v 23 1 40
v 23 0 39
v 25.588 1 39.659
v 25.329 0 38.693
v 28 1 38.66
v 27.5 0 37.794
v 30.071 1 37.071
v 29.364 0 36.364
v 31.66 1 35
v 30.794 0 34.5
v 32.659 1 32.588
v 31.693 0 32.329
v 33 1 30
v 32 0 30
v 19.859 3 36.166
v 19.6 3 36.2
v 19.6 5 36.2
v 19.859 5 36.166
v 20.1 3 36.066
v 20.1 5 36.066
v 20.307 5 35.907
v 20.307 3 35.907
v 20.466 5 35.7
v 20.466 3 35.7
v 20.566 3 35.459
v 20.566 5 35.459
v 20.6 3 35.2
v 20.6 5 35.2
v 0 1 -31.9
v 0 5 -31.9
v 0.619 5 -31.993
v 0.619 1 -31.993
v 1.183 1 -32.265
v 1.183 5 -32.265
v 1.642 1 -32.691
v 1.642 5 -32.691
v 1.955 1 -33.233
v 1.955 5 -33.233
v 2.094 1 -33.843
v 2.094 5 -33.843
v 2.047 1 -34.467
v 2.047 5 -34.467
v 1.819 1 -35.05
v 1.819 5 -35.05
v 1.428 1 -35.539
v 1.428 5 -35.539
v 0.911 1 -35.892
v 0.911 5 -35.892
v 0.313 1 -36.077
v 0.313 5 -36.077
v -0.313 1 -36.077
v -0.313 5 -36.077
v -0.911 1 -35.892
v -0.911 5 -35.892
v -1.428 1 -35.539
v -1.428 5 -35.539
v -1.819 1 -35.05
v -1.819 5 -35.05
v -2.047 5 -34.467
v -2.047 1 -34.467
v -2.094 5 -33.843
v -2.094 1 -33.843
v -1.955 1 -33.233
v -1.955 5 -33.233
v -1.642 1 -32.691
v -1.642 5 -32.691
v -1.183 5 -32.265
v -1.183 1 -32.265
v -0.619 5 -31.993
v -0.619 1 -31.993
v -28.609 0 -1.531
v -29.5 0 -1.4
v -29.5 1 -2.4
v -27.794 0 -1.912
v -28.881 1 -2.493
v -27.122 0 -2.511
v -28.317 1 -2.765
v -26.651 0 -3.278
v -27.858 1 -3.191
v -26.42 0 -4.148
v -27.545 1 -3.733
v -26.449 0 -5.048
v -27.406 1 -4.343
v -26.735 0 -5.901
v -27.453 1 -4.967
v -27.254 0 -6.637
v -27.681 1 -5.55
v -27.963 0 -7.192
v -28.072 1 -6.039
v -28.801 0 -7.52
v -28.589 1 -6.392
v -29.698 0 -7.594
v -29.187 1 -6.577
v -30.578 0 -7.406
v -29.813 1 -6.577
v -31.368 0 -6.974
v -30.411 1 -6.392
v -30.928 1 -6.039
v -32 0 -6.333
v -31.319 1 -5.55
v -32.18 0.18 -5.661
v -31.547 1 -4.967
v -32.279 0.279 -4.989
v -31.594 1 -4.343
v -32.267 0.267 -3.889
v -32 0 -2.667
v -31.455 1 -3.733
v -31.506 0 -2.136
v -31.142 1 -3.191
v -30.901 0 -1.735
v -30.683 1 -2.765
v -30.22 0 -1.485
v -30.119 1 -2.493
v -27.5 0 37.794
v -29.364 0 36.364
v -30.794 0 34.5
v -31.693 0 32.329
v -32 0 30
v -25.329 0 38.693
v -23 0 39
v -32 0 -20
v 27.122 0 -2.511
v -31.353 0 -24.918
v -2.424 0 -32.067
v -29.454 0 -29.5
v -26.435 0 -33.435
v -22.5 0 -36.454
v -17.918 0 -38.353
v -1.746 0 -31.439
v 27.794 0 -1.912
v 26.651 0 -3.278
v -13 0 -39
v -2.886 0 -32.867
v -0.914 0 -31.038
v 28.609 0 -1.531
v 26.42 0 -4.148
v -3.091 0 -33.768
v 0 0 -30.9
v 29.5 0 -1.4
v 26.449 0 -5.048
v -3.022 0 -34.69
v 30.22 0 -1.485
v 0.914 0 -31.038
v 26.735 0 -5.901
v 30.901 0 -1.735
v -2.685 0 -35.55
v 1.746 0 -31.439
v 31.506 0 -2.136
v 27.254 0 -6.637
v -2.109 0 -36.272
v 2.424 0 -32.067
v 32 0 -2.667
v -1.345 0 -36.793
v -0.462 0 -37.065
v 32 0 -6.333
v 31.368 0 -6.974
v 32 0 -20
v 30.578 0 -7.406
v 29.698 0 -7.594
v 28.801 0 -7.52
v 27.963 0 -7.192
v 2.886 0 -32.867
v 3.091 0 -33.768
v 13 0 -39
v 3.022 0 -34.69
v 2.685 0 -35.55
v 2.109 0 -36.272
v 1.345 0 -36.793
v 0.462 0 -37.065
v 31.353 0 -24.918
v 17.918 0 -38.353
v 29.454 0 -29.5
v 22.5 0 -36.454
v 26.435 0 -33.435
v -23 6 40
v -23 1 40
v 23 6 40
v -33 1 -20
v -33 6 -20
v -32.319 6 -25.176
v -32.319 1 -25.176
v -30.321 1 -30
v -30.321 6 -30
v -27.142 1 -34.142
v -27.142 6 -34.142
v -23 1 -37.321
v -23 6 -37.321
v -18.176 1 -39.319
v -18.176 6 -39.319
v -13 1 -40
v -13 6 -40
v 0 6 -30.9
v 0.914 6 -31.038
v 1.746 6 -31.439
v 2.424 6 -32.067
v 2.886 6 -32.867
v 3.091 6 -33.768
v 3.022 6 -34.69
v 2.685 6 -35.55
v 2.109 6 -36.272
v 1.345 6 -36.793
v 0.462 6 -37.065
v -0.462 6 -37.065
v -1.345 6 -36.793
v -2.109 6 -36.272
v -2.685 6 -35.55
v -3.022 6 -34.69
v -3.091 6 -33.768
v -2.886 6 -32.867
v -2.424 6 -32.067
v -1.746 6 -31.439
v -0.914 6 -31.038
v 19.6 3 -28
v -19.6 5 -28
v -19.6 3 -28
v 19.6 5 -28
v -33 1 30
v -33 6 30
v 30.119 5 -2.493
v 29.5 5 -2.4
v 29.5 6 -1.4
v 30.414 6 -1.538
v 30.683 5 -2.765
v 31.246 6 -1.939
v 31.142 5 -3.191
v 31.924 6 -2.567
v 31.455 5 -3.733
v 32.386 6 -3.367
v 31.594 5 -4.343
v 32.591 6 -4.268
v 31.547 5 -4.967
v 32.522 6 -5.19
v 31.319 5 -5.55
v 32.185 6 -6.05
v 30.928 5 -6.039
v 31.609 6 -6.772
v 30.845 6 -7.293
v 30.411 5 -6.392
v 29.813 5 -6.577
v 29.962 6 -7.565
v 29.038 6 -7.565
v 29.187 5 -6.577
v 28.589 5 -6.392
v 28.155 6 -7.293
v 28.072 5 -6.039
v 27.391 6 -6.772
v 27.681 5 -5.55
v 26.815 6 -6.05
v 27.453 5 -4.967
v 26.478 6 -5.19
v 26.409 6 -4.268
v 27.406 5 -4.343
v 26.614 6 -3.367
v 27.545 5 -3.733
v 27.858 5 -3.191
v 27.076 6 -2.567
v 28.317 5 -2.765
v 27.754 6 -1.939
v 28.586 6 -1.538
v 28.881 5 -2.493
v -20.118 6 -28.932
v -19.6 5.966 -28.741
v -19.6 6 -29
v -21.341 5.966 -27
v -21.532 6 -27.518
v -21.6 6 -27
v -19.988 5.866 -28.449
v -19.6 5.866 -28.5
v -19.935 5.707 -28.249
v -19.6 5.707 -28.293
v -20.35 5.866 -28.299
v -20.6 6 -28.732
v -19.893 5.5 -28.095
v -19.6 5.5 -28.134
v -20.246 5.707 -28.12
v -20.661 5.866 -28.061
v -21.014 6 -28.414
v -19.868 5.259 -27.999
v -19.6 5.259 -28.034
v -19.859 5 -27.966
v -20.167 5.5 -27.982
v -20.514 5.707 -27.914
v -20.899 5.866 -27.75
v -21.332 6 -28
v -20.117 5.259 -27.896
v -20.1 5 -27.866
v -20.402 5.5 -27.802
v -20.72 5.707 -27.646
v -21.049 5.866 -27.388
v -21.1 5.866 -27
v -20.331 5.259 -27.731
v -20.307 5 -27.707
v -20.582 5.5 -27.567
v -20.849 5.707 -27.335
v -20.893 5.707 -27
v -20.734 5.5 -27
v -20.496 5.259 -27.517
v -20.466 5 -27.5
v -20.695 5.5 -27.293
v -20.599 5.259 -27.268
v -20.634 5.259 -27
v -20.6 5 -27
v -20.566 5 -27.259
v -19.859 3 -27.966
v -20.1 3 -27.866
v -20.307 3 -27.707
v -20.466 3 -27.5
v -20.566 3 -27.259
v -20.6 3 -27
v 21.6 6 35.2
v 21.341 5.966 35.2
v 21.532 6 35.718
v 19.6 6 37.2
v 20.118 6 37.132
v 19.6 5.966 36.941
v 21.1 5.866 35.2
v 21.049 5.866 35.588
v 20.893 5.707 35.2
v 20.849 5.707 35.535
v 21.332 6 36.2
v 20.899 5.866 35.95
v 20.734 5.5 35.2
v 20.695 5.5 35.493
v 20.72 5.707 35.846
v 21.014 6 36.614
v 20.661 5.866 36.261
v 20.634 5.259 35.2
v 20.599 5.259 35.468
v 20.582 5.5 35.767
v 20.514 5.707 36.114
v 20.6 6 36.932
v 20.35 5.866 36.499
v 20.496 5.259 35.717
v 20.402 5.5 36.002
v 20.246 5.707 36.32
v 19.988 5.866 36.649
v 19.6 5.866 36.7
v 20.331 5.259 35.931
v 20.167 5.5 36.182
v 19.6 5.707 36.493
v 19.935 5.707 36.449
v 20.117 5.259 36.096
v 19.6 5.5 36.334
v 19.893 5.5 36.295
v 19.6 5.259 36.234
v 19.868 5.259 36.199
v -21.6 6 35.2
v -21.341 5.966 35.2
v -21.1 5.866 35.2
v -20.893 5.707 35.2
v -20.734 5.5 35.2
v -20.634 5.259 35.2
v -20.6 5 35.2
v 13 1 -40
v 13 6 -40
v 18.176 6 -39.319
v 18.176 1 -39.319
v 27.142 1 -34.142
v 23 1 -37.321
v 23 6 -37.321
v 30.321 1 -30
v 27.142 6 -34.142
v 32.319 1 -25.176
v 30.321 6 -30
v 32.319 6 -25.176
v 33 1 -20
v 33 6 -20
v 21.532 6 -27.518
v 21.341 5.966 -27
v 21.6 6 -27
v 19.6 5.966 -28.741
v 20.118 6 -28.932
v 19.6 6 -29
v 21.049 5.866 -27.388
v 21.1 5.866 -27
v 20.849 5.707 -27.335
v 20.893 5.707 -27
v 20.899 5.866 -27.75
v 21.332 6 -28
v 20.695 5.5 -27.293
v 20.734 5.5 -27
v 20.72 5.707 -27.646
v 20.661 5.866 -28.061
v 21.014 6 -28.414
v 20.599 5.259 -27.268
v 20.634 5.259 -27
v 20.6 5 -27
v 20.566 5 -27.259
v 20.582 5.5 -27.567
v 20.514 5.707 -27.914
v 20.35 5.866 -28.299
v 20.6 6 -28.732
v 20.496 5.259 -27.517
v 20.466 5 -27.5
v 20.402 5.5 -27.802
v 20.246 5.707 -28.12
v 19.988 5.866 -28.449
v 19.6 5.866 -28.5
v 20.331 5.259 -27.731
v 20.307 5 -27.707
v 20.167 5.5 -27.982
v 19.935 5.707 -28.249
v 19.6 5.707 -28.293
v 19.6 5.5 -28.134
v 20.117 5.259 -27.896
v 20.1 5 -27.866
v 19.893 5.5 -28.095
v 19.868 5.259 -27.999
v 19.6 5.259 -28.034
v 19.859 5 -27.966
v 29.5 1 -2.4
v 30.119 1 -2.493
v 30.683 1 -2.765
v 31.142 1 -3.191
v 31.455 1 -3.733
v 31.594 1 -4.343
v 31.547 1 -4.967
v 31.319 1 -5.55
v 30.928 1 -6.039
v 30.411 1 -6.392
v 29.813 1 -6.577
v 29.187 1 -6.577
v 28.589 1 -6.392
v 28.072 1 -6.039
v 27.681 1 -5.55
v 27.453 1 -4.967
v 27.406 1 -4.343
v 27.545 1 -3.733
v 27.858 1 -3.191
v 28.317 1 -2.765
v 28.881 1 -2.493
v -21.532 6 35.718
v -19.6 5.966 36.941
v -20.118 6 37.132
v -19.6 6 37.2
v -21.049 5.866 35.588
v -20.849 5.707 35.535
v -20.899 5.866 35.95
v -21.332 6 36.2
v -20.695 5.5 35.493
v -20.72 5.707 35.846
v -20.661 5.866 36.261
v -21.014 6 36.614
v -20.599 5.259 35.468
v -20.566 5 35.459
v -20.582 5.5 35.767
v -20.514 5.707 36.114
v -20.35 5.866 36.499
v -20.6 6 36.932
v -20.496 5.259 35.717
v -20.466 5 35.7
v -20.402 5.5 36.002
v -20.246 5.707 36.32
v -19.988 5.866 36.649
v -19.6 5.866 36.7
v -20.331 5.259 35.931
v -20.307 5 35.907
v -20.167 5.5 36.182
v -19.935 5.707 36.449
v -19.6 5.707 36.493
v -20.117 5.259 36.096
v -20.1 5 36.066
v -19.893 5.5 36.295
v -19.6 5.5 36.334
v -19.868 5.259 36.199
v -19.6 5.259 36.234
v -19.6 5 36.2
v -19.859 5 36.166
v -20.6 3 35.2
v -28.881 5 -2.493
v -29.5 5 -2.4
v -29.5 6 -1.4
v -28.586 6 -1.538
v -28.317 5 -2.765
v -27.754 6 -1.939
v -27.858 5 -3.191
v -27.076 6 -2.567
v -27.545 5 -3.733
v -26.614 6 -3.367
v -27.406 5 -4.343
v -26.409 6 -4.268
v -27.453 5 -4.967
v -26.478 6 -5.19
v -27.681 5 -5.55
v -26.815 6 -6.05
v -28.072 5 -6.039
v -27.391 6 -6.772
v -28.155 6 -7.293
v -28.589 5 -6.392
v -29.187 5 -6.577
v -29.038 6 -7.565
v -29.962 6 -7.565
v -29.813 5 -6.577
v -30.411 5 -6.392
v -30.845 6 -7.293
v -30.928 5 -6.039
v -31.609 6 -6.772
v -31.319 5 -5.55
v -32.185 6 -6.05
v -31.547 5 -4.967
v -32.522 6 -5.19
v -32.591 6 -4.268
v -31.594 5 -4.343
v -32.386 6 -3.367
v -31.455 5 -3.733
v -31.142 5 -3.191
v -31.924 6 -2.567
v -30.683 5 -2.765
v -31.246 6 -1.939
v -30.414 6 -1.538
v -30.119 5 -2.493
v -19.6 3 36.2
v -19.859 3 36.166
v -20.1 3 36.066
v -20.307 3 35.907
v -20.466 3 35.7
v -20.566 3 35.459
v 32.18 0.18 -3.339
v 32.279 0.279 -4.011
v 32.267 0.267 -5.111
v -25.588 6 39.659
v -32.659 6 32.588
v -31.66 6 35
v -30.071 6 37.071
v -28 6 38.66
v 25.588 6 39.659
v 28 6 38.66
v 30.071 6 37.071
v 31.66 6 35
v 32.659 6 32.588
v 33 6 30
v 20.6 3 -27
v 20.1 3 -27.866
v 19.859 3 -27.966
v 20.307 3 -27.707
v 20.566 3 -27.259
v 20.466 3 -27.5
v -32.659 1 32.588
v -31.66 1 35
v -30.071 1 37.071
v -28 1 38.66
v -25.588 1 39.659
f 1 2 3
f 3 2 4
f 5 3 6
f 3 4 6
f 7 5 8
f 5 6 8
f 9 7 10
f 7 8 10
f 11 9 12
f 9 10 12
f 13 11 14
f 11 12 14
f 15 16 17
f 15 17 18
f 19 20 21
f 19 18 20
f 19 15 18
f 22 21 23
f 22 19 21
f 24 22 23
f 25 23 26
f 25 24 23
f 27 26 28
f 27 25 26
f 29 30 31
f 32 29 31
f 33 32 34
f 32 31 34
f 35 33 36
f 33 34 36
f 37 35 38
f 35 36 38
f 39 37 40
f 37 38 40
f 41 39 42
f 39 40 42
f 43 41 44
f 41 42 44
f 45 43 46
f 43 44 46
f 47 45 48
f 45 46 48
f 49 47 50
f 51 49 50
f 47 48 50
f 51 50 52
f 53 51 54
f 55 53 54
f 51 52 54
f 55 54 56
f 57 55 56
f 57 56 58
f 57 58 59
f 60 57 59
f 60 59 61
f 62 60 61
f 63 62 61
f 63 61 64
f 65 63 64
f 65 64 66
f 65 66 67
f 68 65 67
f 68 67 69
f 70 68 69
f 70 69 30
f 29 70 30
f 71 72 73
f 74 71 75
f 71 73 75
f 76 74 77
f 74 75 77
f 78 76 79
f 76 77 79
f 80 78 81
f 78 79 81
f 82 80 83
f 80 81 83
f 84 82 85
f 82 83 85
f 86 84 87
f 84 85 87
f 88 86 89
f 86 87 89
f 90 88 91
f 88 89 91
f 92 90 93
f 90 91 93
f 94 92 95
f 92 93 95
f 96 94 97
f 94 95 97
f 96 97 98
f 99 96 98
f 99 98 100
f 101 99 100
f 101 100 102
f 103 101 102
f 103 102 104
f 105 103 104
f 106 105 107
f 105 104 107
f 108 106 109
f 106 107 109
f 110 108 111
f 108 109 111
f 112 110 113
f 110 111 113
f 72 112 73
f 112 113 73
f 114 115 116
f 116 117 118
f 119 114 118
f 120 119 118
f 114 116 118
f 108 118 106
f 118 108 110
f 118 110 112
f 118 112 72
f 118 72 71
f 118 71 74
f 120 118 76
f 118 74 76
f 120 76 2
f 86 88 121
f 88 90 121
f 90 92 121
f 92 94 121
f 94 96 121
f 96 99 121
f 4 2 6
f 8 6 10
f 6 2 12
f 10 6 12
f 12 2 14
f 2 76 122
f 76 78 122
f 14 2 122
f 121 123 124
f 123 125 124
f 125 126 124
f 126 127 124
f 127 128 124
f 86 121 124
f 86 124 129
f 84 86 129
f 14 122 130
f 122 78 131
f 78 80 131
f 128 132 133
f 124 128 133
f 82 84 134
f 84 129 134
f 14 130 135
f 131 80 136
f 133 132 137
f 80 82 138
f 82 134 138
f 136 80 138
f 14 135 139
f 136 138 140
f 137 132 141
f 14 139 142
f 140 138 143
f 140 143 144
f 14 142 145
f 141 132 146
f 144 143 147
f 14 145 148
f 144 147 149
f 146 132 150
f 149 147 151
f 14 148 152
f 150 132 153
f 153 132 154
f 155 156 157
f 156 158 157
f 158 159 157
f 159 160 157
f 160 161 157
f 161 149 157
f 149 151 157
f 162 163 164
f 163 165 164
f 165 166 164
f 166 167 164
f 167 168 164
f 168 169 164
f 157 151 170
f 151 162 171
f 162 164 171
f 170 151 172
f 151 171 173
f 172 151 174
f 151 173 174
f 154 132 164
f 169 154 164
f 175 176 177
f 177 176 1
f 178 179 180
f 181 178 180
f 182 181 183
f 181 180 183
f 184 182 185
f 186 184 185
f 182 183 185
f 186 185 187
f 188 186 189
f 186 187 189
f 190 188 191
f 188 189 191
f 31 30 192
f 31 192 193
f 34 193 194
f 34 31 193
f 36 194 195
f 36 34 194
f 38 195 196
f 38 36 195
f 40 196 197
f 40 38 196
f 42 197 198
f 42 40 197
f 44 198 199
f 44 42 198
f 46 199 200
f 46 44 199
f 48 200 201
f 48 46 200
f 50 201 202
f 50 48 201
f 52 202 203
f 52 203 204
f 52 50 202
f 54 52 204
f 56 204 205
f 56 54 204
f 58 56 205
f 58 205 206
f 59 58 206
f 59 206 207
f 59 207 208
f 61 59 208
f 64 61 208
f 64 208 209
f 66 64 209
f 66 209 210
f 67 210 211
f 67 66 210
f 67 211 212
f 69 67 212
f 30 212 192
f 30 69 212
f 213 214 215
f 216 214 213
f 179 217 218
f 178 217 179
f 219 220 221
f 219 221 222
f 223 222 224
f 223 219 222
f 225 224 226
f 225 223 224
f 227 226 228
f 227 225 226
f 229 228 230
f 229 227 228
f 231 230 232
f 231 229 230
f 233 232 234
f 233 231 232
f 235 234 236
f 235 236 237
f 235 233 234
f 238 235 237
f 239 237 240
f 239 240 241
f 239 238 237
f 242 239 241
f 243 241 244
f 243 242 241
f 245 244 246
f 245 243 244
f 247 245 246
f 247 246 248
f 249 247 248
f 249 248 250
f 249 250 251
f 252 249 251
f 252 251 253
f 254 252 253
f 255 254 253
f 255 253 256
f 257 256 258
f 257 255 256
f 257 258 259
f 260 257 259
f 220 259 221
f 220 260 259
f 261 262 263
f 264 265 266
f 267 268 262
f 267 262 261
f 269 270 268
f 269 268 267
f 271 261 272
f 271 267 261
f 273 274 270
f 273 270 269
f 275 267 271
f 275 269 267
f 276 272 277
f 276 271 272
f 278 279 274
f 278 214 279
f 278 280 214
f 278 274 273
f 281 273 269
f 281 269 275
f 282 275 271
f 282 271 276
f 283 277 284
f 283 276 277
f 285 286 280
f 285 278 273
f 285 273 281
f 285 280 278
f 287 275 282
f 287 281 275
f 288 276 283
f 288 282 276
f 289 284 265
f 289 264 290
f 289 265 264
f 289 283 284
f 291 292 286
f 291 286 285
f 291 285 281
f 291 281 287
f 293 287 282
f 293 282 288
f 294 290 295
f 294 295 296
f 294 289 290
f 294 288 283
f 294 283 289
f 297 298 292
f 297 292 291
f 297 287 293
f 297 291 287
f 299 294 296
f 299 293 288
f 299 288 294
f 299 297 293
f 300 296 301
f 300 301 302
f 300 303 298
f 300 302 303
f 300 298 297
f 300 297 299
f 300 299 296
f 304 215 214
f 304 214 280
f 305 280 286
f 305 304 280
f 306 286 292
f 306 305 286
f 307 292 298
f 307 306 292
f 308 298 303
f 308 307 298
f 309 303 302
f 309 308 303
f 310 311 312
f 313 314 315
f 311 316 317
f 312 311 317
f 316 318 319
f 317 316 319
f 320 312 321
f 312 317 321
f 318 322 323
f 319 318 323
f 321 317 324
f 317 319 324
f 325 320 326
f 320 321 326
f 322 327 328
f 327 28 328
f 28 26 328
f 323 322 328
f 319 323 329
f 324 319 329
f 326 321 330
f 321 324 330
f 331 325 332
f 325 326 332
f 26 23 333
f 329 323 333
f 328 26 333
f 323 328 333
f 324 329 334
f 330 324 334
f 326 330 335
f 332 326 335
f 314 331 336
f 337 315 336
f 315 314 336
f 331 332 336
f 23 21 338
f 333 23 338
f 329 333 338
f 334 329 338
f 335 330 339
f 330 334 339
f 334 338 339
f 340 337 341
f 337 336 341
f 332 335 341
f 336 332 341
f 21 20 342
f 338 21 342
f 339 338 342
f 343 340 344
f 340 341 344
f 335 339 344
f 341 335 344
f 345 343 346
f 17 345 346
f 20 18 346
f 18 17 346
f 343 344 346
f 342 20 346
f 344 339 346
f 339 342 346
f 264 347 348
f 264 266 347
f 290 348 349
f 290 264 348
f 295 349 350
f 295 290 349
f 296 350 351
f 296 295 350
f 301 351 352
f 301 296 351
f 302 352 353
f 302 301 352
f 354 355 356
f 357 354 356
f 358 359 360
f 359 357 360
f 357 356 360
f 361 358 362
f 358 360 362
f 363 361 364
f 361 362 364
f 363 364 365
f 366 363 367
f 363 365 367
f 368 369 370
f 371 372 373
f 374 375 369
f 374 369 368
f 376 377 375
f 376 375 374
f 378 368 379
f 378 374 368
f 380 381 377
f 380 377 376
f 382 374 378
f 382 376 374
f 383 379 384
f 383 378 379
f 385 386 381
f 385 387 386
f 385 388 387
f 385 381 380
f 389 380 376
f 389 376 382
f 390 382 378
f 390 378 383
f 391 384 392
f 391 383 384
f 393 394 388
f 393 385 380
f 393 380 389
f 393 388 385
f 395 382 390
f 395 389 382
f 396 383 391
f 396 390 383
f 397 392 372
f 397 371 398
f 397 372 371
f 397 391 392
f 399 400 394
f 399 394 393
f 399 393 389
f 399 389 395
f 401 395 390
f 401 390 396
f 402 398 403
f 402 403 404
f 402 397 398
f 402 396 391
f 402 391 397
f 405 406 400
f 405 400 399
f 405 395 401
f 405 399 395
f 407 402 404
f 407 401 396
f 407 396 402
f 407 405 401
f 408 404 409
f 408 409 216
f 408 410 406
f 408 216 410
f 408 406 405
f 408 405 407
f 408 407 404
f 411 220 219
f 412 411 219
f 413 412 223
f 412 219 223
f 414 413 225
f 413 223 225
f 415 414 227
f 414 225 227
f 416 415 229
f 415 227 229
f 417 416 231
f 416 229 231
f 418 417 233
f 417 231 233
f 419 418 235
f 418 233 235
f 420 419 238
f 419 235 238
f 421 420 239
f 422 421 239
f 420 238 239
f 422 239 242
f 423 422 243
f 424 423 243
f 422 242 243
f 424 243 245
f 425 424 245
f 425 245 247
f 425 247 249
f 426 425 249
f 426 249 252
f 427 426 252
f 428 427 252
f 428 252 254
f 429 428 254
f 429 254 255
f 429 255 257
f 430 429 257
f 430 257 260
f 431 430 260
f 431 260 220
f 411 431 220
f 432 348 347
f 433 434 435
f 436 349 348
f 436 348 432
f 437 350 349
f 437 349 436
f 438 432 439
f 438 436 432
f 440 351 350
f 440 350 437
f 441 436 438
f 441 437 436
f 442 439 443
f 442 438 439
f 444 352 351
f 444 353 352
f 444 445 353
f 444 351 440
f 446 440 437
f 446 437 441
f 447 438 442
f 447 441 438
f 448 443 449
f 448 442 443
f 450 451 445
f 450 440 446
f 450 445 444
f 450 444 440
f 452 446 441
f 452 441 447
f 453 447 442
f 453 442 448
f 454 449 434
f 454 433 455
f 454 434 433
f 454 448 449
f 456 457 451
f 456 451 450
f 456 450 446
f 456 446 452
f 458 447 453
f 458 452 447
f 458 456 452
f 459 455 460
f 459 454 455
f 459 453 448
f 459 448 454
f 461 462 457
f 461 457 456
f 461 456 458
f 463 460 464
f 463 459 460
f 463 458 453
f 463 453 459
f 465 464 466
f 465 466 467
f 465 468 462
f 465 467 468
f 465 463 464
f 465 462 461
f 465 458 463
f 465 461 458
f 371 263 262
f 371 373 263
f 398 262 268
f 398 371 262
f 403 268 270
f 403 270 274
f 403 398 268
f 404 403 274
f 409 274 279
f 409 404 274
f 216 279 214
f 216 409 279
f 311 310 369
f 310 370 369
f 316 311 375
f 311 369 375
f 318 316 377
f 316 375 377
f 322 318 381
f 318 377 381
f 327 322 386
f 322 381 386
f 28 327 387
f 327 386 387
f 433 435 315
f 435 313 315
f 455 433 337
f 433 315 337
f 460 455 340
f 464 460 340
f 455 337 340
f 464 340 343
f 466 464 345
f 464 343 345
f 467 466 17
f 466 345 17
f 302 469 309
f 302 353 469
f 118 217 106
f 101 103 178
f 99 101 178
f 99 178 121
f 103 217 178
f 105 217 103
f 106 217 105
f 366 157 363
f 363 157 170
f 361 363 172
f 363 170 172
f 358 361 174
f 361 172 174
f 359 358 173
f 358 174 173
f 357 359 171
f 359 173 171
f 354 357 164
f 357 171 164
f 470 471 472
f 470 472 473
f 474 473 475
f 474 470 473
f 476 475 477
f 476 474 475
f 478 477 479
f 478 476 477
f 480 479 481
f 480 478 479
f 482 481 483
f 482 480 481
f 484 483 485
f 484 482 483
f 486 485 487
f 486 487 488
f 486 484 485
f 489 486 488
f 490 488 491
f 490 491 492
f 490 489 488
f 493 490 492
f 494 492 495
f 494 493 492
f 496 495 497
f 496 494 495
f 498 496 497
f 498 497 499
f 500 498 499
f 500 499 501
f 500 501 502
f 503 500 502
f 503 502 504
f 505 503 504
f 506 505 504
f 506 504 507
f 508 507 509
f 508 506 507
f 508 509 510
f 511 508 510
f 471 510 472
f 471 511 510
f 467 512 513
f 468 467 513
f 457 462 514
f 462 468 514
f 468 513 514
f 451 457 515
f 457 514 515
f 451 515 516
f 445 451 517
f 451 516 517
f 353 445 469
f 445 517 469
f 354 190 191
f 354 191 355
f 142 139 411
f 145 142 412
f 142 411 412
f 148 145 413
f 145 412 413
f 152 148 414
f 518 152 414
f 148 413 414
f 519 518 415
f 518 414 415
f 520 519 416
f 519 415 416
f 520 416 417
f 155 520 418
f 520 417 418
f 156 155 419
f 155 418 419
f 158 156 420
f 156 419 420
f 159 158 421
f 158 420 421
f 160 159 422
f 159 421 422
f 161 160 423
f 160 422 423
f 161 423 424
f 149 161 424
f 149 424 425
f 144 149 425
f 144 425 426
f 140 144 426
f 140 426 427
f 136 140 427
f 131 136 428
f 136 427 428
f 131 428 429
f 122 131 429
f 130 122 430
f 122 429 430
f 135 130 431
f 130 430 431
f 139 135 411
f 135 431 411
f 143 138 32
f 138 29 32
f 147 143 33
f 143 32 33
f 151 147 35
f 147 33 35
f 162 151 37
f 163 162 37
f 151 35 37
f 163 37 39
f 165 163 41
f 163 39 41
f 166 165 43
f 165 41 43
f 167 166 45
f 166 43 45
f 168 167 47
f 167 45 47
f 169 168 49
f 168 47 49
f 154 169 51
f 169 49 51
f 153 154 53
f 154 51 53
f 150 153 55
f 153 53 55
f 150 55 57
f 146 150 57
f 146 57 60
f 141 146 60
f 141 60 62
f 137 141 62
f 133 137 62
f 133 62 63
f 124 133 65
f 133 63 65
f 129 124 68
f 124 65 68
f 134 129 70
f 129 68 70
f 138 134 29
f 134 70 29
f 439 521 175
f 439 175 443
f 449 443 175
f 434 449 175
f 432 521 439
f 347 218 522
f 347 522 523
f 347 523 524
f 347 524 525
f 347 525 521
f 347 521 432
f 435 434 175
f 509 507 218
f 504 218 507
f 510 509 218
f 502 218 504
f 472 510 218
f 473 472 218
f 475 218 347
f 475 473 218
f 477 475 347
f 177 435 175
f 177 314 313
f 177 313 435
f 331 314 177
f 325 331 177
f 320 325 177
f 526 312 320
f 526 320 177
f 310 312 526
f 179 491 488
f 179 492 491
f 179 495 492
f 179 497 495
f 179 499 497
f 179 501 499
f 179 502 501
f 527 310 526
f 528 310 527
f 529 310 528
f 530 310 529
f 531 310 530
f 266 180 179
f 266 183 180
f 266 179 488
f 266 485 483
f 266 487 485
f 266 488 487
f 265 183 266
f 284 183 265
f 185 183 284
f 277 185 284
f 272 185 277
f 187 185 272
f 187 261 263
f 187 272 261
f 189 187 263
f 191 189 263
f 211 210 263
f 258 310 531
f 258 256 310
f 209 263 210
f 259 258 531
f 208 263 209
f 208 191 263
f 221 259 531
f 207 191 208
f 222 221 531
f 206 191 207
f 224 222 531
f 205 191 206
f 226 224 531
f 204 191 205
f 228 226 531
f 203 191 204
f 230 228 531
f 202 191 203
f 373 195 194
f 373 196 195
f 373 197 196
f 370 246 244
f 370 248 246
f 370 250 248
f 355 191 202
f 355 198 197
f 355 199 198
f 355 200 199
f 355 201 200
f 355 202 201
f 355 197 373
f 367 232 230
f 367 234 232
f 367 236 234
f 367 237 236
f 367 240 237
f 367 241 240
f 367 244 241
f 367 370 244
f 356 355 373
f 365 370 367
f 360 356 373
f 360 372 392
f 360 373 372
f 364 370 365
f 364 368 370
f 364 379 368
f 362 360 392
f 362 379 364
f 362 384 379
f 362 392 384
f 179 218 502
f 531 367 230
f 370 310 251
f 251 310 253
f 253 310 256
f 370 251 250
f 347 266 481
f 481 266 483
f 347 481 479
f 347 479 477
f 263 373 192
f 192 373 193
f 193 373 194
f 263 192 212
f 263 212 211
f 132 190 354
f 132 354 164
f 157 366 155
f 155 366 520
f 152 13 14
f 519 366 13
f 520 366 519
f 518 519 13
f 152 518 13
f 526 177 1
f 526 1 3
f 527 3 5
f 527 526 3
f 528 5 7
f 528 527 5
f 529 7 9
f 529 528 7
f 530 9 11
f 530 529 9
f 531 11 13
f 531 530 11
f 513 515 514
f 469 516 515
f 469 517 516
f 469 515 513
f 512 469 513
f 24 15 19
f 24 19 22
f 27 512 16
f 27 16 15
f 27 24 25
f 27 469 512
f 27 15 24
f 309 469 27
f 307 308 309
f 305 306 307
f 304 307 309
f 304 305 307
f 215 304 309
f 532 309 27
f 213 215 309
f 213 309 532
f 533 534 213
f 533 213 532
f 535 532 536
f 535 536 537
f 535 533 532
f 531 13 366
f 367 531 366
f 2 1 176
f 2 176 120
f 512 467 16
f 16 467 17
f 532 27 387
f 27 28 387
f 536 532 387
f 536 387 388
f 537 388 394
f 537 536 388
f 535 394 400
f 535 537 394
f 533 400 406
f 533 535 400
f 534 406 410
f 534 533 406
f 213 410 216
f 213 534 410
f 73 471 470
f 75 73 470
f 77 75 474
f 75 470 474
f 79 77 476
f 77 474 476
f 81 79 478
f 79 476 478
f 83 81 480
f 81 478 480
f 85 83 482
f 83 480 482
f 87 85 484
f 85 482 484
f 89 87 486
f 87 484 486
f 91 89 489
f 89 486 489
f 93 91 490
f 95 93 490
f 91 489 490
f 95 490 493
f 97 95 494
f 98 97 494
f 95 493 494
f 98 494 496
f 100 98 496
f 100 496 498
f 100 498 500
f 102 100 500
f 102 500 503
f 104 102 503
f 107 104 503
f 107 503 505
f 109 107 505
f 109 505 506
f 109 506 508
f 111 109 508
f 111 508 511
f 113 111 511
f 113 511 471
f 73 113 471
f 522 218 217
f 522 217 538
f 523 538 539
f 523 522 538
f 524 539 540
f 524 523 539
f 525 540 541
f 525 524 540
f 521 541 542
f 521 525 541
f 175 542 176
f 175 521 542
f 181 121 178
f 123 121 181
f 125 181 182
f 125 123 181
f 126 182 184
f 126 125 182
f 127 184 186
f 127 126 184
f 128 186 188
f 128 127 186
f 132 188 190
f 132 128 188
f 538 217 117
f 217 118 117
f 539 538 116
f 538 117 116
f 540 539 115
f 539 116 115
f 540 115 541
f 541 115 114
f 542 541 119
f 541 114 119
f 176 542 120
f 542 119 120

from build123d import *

# Parameters (mm, degrees)
SKETCH_1_W          = 66
SKETCH_1_H          = 80
EXTRUDE_1_DEPTH     = 6
SKETCH_2_W          = 41.2
SKETCH_2_H          = 64.2
CUT_EXTRUDE_1_DEPTH = 3
FILLET_1_R          = 1
SKETCH_3_R          = 2.1
CUT_EXTRUDE_2_DEPTH = 53.201532545
CHAMFER_1_SIZE      = 1
FILLET_2_R          = 20
FILLET_3_R          = 10
CHAMFER_2_SIZE      = 1


with BuildPart() as part:
    # Эскиз1 → Бобышка-Вытянуть1 (new body)
    with BuildSketch(Plane(origin=(0, 0, 0), x_dir=(1, 0, 0), z_dir=(0, 1, 0))):
        Rectangle(SKETCH_1_W, SKETCH_1_H)
    extrude(amount=EXTRUDE_1_DEPTH)

    # Эскиз2 → Вырез-Вытянуть1 (cut)
    with BuildSketch(Plane(origin=(0, 6, 0), x_dir=(1, 0, 0), z_dir=(0, 1, 0))):
        with Locations((0, -4.1)):
            Rectangle(SKETCH_2_W, SKETCH_2_H)
    extrude(amount=-CUT_EXTRUDE_1_DEPTH, mode=Mode.SUBTRACT)

    # Скругление1
    fillet_1_edges = [part.edges().sort_by_distance(p)[0] for p in [
        (20.6, 4.5, -28),
        (20.6, 4.5, 36.2),
        (-20.6, 4.5, 36.2),
        (-20.6, 4.5, -28),
        (20.6, 6, 4.1),
        (0, 6, -28),
        (-20.6, 6, 4.1),
        (0, 6, 36.2),
    ]]
    fillet(fillet_1_edges, radius=FILLET_1_R)

    # Эскиз3 → Вырез-Вытянуть2 (cut, through all)
    with BuildSketch(Plane(origin=(0, 6, 0), x_dir=(1, 0, 0), z_dir=(0, 1, 0))):
        with Locations(Location((0, 34, 0), (0, 0, 270))):
            Circle(SKETCH_3_R)
        with Locations(Location((-29.5, 4.5, 0), (0, 0, 270))):
            Circle(SKETCH_3_R)
        with Locations(Location((29.5, 4.5, 0), (0, 0, 270))):
            Circle(SKETCH_3_R)
    extrude(amount=-CUT_EXTRUDE_2_DEPTH, mode=Mode.SUBTRACT)

    # Фаска1
    chamfer_1_edges = [part.edges().sort_by_distance(p)[0] for p in [
        (0, 6, -36.1),
        (-29.5, 6, -6.6),
        (29.5, 6, -6.6),
    ]]
    chamfer(chamfer_1_edges, length=CHAMFER_1_SIZE)

    # Скругление2
    fillet_2_edges = [part.edges().sort_by_distance(p)[0] for p in [
        (-33, 3, -40),
        (33, 3, -40),
    ]]
    fillet(fillet_2_edges, radius=FILLET_2_R)

    # Скругление3
    fillet_3_edges = [part.edges().sort_by_distance(p)[0] for p in [
        (33, 3, 40),
        (-33, 3, 40),
    ]]
    fillet(fillet_3_edges, radius=FILLET_3_R)

    # Фаска2
    # the kernel refuses this chamfer: 1 mm, written as the material it takes off along each edge
    with BuildSketch(Plane(origin=(-23, 0, 30), x_dir=(-1, 0, 0), z_dir=(0, 0, -1))) as chamfer_2_piece_1:
        Polygon((10, CHAMFER_2_SIZE), (10 - CHAMFER_2_SIZE, 0), (10, 0), align=None)
    revolve(axis=Axis((-23, 0, 30), (0, 1, 0)), revolution_arc=90, mode=Mode.SUBTRACT)
    with BuildSketch(Plane(origin=(0, 0, -34), x_dir=(0, 0, 1), z_dir=(-1, 0, 0))) as chamfer_2_piece_2:
        Polygon((2.1 + CHAMFER_2_SIZE, 0), (2.1, CHAMFER_2_SIZE), (2.1, 0), align=None)
    revolve(axis=Axis((0, 0, -34), (0, 1, 0)), mode=Mode.SUBTRACT)
    with BuildSketch(Plane(origin=(-29.5, 0, -4.5), x_dir=(0, 0, 1), z_dir=(-1, 0, 0))) as chamfer_2_piece_3:
        Polygon((2.1 + CHAMFER_2_SIZE, 0), (2.1, CHAMFER_2_SIZE), (2.1, 0), align=None)
    revolve(axis=Axis((-29.5, 0, -4.5), (0, 1, 0)), mode=Mode.SUBTRACT)
    with BuildSketch(Plane(origin=(29.5, 0, -4.5), x_dir=(0, 0, 1), z_dir=(-1, 0, 0))) as chamfer_2_piece_4:
        Polygon((2.1 + CHAMFER_2_SIZE, 0), (2.1, CHAMFER_2_SIZE), (2.1, 0), align=None)
    revolve(axis=Axis((29.5, 0, -4.5), (0, 1, 0)), mode=Mode.SUBTRACT)
    with BuildSketch(Plane(origin=(-33, 0, -20), x_dir=(-0.02749587661058908, 0.9996219169112968, 0), z_dir=(0, 0, 1)), Plane(origin=(33, 0, 30), x_dir=(0.02749587661058908, 0.9996219169112968, 0), z_dir=(0, 0, -1))) as chamfer_2_piece_5:
        Polygon((CHAMFER_2_SIZE * 0.999621916911, -CHAMFER_2_SIZE * 0.0274958766106), (-CHAMFER_2_SIZE * 0.0274958766106, -CHAMFER_2_SIZE * 0.999621916911), (0, 0), align=None)
    extrude(amount=50, mode=Mode.SUBTRACT)
    with BuildSketch(Plane(origin=(13, 0, -40), x_dir=(0, 0.9996219169112968, -0.02749587661058908), z_dir=(-1, 0, 0))) as chamfer_2_piece_6:
        Polygon((CHAMFER_2_SIZE * 0.999621916911, -CHAMFER_2_SIZE * 0.0274958766106), (-CHAMFER_2_SIZE * 0.0274958766106, -CHAMFER_2_SIZE * 0.999621916911), (0, 0), align=None)
    extrude(amount=26, mode=Mode.SUBTRACT)
    with BuildSketch(Plane(origin=(13, 0, -20), x_dir=(1, 0, 0), z_dir=(0, 0, 1))) as chamfer_2_piece_7:
        Polygon((20, CHAMFER_2_SIZE), (20 - CHAMFER_2_SIZE, 0), (20, 0), align=None)
    revolve(axis=Axis((13, 0, -20), (0, 1, 0)), revolution_arc=90, mode=Mode.SUBTRACT)
    with BuildSketch(Plane(origin=(-13, 0, -20), x_dir=(-1, 0, 0), z_dir=(0, 0, 1))) as chamfer_2_piece_8:
        Polygon((20, -CHAMFER_2_SIZE), (20 - CHAMFER_2_SIZE, 0), (20, 0), align=None)
    revolve(axis=Axis((-13, 0, -20), (0, -1, 0)), revolution_arc=90, mode=Mode.SUBTRACT)
    with BuildSketch(Plane(origin=(-23, 0, 40), x_dir=(0, 0.9996219169112968, 0.02749587661058908), z_dir=(1, 0, 0))) as chamfer_2_piece_9:
        Polygon((CHAMFER_2_SIZE * 0.999621916911, -CHAMFER_2_SIZE * 0.0274958766106), (-CHAMFER_2_SIZE * 0.0274958766106, -CHAMFER_2_SIZE * 0.999621916911), (0, 0), align=None)
    extrude(amount=46, mode=Mode.SUBTRACT)
    with BuildSketch(Plane(origin=(23, 0, 30), x_dir=(0, 0, 1), z_dir=(-1, 0, 0))) as chamfer_2_piece_10:
        Polygon((10, CHAMFER_2_SIZE), (10 - CHAMFER_2_SIZE, 0), (10, 0), align=None)
    revolve(axis=Axis((23, 0, 30), (0, 1, 0)), revolution_arc=90, mode=Mode.SUBTRACT)


solid = part.part
